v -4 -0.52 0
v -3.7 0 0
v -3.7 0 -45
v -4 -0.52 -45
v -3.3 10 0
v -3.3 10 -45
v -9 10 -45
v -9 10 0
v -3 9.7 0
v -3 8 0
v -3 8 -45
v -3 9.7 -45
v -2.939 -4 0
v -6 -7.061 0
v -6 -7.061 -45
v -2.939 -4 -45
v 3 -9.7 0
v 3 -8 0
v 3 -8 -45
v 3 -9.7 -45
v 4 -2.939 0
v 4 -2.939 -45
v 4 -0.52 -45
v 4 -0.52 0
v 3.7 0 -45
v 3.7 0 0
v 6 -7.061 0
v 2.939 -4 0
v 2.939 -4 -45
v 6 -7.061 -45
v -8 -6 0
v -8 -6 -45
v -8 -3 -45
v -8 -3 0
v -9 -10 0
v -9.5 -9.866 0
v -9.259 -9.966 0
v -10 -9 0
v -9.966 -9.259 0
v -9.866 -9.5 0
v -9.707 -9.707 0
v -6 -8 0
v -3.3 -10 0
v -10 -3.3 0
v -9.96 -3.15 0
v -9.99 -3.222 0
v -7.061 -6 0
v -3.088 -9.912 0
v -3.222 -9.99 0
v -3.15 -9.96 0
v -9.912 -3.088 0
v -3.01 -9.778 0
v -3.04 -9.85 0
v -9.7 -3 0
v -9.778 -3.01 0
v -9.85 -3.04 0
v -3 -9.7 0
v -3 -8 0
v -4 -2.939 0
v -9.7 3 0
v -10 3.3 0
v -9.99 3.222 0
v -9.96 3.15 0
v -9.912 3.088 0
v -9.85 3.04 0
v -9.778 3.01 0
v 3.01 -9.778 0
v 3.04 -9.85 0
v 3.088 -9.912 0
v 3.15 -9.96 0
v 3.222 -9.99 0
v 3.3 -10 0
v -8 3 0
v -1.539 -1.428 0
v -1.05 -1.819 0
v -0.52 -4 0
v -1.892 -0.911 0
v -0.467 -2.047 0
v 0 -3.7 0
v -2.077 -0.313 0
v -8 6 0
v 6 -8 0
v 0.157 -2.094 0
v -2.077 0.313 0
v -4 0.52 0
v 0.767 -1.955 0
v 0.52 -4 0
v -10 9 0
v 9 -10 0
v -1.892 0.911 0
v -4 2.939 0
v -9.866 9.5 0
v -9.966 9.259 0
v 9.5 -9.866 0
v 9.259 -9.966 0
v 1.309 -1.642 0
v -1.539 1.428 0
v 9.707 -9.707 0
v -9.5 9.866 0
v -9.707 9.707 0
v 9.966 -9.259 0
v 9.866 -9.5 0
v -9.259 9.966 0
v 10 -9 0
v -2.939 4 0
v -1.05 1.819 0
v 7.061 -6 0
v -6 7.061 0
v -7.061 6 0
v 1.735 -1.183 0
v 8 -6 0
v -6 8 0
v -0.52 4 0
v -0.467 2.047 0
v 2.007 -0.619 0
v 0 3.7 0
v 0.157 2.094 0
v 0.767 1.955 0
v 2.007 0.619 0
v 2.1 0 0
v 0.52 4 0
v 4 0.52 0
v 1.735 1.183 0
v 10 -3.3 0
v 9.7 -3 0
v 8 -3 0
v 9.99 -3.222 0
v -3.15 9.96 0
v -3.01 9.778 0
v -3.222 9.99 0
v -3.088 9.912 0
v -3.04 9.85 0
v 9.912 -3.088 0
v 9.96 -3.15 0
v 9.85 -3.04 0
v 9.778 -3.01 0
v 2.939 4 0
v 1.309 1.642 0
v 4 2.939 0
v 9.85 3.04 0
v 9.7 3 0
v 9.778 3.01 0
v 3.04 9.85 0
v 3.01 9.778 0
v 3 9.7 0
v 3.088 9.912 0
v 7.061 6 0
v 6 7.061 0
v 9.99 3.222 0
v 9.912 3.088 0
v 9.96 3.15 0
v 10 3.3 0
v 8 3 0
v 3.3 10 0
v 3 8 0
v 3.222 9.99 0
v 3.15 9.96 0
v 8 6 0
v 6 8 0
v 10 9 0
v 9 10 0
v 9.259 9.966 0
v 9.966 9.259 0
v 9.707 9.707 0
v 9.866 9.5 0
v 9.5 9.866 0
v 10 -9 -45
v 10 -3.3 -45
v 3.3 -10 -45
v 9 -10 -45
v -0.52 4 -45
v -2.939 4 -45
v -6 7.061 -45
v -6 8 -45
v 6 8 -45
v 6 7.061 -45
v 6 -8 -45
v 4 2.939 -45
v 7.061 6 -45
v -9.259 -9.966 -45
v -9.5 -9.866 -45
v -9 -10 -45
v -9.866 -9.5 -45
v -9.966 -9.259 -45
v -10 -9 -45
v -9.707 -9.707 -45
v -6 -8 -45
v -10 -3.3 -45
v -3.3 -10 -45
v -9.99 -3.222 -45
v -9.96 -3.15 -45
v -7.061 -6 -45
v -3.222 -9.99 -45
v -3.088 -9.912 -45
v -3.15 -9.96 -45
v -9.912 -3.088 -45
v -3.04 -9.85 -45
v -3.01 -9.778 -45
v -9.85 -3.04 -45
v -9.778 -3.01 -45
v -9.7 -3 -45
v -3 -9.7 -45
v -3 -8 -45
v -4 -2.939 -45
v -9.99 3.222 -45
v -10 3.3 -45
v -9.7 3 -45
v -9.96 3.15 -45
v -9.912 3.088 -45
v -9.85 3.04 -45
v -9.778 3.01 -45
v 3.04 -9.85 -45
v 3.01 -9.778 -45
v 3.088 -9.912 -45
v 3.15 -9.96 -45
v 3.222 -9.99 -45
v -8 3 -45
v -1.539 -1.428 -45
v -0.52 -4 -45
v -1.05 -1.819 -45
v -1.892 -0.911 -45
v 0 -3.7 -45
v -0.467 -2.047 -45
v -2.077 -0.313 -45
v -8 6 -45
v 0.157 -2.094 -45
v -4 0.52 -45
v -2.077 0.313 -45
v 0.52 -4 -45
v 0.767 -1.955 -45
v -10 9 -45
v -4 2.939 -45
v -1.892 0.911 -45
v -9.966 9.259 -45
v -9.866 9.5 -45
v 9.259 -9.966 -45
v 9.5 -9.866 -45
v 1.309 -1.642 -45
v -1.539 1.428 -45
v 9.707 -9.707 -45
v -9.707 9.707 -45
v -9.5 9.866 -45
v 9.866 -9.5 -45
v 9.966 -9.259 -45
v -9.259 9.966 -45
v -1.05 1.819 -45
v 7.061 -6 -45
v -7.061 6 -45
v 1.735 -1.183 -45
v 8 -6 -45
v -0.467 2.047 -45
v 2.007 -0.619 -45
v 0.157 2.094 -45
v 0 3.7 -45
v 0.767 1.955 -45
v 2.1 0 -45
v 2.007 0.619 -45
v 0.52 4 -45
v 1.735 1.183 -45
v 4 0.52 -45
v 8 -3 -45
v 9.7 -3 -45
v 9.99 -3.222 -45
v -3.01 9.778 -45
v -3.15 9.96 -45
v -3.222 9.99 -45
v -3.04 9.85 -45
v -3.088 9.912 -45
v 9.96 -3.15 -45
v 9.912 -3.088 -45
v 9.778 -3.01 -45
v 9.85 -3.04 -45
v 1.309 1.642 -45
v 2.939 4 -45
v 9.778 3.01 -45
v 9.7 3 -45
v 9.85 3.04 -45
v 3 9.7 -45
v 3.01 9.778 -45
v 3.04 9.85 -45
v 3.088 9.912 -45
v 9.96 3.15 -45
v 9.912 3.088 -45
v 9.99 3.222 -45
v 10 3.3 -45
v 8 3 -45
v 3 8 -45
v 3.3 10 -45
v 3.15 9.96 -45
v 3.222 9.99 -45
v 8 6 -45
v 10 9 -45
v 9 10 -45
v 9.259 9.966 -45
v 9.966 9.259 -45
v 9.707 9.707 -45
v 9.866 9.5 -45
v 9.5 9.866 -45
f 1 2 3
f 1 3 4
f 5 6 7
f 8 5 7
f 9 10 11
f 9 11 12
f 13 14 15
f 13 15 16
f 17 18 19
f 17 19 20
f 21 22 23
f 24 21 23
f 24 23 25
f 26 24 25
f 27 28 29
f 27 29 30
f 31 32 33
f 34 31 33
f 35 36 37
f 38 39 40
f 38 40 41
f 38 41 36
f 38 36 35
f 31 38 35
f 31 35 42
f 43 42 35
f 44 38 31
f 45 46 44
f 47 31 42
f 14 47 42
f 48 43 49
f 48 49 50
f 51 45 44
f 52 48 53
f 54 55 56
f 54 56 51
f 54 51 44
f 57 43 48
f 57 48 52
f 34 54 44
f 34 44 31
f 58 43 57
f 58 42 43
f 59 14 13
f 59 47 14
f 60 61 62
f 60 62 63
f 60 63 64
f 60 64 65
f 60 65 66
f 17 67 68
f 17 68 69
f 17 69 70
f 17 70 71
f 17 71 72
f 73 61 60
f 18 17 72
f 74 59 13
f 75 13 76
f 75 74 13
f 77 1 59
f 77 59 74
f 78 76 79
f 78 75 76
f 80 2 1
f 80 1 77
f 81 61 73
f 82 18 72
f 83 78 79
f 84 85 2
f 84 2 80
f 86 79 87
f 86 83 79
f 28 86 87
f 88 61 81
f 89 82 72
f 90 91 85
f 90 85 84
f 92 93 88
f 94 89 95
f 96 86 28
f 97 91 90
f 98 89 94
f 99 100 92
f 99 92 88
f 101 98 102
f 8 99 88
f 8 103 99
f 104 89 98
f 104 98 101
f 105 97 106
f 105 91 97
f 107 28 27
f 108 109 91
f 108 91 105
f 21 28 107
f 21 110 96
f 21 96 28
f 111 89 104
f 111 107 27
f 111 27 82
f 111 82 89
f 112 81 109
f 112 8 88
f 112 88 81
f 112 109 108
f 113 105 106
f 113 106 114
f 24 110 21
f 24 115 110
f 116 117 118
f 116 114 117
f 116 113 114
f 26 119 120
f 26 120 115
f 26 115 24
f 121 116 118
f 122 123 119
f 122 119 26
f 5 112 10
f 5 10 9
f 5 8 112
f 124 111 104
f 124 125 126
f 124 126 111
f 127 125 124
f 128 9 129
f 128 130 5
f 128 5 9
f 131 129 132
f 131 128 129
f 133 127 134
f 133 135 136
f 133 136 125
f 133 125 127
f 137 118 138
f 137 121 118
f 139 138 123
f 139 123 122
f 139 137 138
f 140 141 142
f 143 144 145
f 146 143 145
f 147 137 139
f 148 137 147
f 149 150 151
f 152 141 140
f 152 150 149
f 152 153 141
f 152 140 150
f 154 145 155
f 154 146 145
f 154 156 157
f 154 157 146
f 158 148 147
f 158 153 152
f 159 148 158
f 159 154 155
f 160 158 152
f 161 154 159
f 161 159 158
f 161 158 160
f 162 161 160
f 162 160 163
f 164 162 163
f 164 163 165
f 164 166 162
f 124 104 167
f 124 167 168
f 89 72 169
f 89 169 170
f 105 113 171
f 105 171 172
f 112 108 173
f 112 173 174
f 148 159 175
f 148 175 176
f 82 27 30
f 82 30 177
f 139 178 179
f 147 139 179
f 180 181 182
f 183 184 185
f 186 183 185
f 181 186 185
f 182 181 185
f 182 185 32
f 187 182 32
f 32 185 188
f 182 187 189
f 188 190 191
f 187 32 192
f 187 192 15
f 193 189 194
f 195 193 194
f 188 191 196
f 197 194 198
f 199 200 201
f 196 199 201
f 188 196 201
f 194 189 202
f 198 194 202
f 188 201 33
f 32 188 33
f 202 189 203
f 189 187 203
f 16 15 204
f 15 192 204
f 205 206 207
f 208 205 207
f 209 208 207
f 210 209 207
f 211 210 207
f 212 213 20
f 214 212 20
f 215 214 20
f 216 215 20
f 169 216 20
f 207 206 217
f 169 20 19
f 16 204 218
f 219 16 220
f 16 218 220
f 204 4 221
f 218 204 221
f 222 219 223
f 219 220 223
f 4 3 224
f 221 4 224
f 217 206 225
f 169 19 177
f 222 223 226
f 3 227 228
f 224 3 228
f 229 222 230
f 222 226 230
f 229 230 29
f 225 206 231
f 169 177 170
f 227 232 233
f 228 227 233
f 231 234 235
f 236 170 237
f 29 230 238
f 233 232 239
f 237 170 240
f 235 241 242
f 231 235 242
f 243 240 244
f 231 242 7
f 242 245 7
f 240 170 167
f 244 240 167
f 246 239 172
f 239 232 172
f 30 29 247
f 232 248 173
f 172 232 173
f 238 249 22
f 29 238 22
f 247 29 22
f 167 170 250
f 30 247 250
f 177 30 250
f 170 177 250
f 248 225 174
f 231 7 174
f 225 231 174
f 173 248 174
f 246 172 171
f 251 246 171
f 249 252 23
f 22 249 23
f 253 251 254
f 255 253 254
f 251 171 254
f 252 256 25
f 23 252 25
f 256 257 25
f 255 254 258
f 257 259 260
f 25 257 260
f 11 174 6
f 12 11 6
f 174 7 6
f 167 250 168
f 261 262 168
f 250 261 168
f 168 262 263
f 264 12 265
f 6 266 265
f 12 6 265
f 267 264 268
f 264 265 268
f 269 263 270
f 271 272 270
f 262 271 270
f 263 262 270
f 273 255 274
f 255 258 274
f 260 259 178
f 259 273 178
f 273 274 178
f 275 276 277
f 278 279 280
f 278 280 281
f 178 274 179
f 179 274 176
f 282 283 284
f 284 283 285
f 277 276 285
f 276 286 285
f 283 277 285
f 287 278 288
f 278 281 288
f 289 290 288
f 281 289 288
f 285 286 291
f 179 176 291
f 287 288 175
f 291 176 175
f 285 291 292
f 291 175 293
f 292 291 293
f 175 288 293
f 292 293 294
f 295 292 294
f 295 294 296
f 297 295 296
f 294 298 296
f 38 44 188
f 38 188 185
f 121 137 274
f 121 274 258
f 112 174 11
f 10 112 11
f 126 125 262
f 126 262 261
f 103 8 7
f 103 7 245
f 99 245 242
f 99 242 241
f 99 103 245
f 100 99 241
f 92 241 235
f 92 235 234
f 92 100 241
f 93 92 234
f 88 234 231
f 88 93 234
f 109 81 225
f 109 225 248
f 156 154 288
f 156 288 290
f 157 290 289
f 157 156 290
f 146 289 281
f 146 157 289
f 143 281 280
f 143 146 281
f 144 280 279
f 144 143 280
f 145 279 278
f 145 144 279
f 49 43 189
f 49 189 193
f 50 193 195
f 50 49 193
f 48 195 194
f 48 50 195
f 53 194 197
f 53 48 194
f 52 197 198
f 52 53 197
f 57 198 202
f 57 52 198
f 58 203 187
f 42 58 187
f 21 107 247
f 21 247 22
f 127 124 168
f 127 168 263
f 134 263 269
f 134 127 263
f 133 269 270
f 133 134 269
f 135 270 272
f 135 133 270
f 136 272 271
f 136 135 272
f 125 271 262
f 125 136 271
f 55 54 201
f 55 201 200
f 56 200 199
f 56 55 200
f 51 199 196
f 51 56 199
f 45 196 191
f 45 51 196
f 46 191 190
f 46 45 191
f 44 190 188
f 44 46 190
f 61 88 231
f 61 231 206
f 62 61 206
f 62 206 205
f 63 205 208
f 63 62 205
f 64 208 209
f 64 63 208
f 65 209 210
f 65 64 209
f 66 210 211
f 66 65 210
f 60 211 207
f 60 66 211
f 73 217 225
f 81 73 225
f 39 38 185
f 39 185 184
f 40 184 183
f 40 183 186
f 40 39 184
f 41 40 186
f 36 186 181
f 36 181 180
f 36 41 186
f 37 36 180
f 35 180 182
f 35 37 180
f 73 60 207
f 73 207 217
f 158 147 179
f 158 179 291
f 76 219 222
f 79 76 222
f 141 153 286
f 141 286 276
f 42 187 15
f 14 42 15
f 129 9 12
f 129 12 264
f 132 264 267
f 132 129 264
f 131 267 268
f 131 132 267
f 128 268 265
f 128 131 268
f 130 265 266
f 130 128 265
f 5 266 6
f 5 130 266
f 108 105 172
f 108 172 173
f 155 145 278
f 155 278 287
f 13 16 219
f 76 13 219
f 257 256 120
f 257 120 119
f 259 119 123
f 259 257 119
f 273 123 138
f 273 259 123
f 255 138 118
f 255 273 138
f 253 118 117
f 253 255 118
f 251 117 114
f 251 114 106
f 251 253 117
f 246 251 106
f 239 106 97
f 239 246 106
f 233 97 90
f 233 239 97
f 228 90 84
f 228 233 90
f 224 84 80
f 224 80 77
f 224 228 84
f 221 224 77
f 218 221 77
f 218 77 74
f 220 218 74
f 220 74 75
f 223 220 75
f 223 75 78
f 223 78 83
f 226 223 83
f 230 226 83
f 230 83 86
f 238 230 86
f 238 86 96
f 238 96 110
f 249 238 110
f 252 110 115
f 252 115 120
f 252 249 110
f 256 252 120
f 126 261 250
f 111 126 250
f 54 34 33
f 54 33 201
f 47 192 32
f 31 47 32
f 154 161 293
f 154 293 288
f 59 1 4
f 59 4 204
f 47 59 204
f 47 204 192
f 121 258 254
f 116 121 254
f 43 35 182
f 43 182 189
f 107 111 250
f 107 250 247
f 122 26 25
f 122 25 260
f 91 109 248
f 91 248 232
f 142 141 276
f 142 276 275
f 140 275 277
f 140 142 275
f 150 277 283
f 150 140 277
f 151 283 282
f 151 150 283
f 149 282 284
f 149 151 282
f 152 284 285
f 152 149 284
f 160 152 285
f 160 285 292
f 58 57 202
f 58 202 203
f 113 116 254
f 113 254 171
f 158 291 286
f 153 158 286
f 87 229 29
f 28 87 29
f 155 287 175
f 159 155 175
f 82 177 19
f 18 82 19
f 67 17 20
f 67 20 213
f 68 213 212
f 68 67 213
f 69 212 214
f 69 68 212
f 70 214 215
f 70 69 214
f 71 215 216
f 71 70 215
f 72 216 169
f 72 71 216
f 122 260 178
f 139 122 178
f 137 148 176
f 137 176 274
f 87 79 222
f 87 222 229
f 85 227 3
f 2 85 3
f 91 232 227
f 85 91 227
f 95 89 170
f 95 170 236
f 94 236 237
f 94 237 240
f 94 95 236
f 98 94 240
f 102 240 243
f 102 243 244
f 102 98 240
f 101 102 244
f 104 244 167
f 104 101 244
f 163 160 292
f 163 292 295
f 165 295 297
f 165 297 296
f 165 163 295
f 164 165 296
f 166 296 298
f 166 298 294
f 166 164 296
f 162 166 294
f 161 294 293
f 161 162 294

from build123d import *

# Parameters (mm, degrees)
BOSS_EXTRUDE1_DEPTH = 45
SKETCH2_W           = 400
SKETCH2_H           = 2.1


with BuildPart() as part:
    # Sketch1 → Boss-Extrude1 (new body)
    with BuildSketch(Plane.XY):
        with BuildLine():
            Line((-10, 9), (-10, 3.29999995))
            ThreePointArc((-10, 3.29999995), (-9.912132049, 3.087867916), (-9.7, 3))
            Line((-9.7, 3), (-8, 3))
            Line((-8, 3), (-8, 6))
            Line((-8, 6), (-7.060677, 6))
            Line((-7.060677, 6), (-4, 2.93932965))
            Line((-4, 2.93932965), (-4, 0.519615242))
            Line((-4, 0.519615242), (-3.699996283, -6.437e-06))
            Line((-3.699996283, -6.437e-06), (-4, -0.519628117))
            Line((-4, -0.519628117), (-4, -2.93933725))
            Line((-4, -2.93933725), (-7.0606695, -6))
            Line((-7.0606695, -6), (-8, -6))
            Line((-8, -6), (-8, -3))
            Line((-8, -3), (-9.7, -3))
            ThreePointArc((-9.7, -3), (-9.912132049, -3.087867916), (-10, -3.29999995))
            Line((-10, -3.29999995), (-10, -9))
            ThreePointArc((-10, -9), (-9.707106781, -9.707106781), (-9, -10))
            Line((-9, -10), (-3.29999995, -10))
            ThreePointArc((-3.29999995, -10), (-3.087867916, -9.912132049), (-3, -9.7))
            Line((-3, -9.7), (-3, -8))
            Line((-3, -8), (-6, -8))
            Line((-6, -8), (-6, -7.0606515))
            Line((-6, -7.0606515), (-2.9393489, -4))
            Line((-2.9393489, -4), (-0.519615242, -4))
            Line((-0.519615242, -4), (6.437e-06, -3.699996283))
            Line((6.437e-06, -3.699996283), (0.519628117, -4))
            Line((0.519628117, -4), (2.9393227, -4))
            Line((2.9393227, -4), (6, -7.060677))
            Line((6, -7.060677), (6, -8))
            Line((6, -8), (3, -8))
            Line((3, -8), (3, -9.7))
            ThreePointArc((3, -9.7), (3.087867916, -9.912132049), (3.29999995, -10))
            Line((3.29999995, -10), (9, -10))
            ThreePointArc((9, -10), (9.707106781, -9.707106781), (10, -9))
            Line((10, -9), (10, -3.29999995))
            ThreePointArc((10, -3.29999995), (9.912132049, -3.087867916), (9.7, -3))
            Line((9.7, -3), (8, -3))
            Line((8, -3), (8, -6))
            Line((8, -6), (7.0606435, -6))
            Line((7.0606435, -6), (4, -2.9393482))
            Line((4, -2.9393482), (4, -0.519615242))
            Line((4, -0.519615242), (3.699996283, 6.437e-06))
            Line((3.699996283, 6.437e-06), (4, 0.519628117))
            Line((4, 0.519628117), (4, 2.9393401))
            Line((4, 2.9393401), (7.060651, 6))
            Line((7.060651, 6), (8, 6))
            Line((8, 6), (8, 3))
            Line((8, 3), (9.7, 3))
            ThreePointArc((9.7, 3), (9.912132049, 3.087867916), (10, 3.29999995))
            Line((10, 3.29999995), (10, 9))
            ThreePointArc((10, 9), (9.707106781, 9.707106781), (9, 10))
            Line((9, 10), (3.29999995, 10))
            ThreePointArc((3.29999995, 10), (3.087867916, 9.912132049), (3, 9.7))
            Line((3, 9.7), (3, 8))
            Line((3, 8), (6, 8))
            Line((6, 8), (6, 7.060669))
            Line((6, 7.060669), (2.9393308, 4))
            Line((2.9393308, 4), (0.519615242, 4))
            Line((0.519615242, 4), (-6.437e-06, 3.699996283))
            Line((-6.437e-06, 3.699996283), (-0.519628117, 4))
            Line((-0.519628117, 4), (-2.93935655, 4))
            Line((-2.93935655, 4), (-6, 7.0606435))
            Line((-6, 7.0606435), (-6, 8))
            Line((-6, 8), (-3, 8))
            Line((-3, 8), (-3, 9.7))
            ThreePointArc((-3, 9.7), (-3.087867966, 9.912132034), (-3.3, 10))
            Line((-3.3, 10), (-9, 10))
            ThreePointArc((-9, 10), (-9.707106781, 9.707106781), (-10, 9))
        make_face()
    extrude(amount=-BOSS_EXTRUDE1_DEPTH)

    # Sketch2 → Cut-Revolve1 (revolve, cut)
    with BuildSketch(Plane(origin=(0, 0, 0), x_dir=(0, 0, -1), z_dir=(1, 0, 0)), mode=Mode.PRIVATE) as cut_revolve1_sk:
        with Locations((200, 1.05)):
            Rectangle(SKETCH2_W, SKETCH2_H)
    revolve(cut_revolve1_sk.sketch.rotate(Axis((0, 0, -400), (0, 0, 1)), 270), axis=Axis((0, 0, -400), (0, 0, 1)), mode=Mode.SUBTRACT)


solid = part.part
